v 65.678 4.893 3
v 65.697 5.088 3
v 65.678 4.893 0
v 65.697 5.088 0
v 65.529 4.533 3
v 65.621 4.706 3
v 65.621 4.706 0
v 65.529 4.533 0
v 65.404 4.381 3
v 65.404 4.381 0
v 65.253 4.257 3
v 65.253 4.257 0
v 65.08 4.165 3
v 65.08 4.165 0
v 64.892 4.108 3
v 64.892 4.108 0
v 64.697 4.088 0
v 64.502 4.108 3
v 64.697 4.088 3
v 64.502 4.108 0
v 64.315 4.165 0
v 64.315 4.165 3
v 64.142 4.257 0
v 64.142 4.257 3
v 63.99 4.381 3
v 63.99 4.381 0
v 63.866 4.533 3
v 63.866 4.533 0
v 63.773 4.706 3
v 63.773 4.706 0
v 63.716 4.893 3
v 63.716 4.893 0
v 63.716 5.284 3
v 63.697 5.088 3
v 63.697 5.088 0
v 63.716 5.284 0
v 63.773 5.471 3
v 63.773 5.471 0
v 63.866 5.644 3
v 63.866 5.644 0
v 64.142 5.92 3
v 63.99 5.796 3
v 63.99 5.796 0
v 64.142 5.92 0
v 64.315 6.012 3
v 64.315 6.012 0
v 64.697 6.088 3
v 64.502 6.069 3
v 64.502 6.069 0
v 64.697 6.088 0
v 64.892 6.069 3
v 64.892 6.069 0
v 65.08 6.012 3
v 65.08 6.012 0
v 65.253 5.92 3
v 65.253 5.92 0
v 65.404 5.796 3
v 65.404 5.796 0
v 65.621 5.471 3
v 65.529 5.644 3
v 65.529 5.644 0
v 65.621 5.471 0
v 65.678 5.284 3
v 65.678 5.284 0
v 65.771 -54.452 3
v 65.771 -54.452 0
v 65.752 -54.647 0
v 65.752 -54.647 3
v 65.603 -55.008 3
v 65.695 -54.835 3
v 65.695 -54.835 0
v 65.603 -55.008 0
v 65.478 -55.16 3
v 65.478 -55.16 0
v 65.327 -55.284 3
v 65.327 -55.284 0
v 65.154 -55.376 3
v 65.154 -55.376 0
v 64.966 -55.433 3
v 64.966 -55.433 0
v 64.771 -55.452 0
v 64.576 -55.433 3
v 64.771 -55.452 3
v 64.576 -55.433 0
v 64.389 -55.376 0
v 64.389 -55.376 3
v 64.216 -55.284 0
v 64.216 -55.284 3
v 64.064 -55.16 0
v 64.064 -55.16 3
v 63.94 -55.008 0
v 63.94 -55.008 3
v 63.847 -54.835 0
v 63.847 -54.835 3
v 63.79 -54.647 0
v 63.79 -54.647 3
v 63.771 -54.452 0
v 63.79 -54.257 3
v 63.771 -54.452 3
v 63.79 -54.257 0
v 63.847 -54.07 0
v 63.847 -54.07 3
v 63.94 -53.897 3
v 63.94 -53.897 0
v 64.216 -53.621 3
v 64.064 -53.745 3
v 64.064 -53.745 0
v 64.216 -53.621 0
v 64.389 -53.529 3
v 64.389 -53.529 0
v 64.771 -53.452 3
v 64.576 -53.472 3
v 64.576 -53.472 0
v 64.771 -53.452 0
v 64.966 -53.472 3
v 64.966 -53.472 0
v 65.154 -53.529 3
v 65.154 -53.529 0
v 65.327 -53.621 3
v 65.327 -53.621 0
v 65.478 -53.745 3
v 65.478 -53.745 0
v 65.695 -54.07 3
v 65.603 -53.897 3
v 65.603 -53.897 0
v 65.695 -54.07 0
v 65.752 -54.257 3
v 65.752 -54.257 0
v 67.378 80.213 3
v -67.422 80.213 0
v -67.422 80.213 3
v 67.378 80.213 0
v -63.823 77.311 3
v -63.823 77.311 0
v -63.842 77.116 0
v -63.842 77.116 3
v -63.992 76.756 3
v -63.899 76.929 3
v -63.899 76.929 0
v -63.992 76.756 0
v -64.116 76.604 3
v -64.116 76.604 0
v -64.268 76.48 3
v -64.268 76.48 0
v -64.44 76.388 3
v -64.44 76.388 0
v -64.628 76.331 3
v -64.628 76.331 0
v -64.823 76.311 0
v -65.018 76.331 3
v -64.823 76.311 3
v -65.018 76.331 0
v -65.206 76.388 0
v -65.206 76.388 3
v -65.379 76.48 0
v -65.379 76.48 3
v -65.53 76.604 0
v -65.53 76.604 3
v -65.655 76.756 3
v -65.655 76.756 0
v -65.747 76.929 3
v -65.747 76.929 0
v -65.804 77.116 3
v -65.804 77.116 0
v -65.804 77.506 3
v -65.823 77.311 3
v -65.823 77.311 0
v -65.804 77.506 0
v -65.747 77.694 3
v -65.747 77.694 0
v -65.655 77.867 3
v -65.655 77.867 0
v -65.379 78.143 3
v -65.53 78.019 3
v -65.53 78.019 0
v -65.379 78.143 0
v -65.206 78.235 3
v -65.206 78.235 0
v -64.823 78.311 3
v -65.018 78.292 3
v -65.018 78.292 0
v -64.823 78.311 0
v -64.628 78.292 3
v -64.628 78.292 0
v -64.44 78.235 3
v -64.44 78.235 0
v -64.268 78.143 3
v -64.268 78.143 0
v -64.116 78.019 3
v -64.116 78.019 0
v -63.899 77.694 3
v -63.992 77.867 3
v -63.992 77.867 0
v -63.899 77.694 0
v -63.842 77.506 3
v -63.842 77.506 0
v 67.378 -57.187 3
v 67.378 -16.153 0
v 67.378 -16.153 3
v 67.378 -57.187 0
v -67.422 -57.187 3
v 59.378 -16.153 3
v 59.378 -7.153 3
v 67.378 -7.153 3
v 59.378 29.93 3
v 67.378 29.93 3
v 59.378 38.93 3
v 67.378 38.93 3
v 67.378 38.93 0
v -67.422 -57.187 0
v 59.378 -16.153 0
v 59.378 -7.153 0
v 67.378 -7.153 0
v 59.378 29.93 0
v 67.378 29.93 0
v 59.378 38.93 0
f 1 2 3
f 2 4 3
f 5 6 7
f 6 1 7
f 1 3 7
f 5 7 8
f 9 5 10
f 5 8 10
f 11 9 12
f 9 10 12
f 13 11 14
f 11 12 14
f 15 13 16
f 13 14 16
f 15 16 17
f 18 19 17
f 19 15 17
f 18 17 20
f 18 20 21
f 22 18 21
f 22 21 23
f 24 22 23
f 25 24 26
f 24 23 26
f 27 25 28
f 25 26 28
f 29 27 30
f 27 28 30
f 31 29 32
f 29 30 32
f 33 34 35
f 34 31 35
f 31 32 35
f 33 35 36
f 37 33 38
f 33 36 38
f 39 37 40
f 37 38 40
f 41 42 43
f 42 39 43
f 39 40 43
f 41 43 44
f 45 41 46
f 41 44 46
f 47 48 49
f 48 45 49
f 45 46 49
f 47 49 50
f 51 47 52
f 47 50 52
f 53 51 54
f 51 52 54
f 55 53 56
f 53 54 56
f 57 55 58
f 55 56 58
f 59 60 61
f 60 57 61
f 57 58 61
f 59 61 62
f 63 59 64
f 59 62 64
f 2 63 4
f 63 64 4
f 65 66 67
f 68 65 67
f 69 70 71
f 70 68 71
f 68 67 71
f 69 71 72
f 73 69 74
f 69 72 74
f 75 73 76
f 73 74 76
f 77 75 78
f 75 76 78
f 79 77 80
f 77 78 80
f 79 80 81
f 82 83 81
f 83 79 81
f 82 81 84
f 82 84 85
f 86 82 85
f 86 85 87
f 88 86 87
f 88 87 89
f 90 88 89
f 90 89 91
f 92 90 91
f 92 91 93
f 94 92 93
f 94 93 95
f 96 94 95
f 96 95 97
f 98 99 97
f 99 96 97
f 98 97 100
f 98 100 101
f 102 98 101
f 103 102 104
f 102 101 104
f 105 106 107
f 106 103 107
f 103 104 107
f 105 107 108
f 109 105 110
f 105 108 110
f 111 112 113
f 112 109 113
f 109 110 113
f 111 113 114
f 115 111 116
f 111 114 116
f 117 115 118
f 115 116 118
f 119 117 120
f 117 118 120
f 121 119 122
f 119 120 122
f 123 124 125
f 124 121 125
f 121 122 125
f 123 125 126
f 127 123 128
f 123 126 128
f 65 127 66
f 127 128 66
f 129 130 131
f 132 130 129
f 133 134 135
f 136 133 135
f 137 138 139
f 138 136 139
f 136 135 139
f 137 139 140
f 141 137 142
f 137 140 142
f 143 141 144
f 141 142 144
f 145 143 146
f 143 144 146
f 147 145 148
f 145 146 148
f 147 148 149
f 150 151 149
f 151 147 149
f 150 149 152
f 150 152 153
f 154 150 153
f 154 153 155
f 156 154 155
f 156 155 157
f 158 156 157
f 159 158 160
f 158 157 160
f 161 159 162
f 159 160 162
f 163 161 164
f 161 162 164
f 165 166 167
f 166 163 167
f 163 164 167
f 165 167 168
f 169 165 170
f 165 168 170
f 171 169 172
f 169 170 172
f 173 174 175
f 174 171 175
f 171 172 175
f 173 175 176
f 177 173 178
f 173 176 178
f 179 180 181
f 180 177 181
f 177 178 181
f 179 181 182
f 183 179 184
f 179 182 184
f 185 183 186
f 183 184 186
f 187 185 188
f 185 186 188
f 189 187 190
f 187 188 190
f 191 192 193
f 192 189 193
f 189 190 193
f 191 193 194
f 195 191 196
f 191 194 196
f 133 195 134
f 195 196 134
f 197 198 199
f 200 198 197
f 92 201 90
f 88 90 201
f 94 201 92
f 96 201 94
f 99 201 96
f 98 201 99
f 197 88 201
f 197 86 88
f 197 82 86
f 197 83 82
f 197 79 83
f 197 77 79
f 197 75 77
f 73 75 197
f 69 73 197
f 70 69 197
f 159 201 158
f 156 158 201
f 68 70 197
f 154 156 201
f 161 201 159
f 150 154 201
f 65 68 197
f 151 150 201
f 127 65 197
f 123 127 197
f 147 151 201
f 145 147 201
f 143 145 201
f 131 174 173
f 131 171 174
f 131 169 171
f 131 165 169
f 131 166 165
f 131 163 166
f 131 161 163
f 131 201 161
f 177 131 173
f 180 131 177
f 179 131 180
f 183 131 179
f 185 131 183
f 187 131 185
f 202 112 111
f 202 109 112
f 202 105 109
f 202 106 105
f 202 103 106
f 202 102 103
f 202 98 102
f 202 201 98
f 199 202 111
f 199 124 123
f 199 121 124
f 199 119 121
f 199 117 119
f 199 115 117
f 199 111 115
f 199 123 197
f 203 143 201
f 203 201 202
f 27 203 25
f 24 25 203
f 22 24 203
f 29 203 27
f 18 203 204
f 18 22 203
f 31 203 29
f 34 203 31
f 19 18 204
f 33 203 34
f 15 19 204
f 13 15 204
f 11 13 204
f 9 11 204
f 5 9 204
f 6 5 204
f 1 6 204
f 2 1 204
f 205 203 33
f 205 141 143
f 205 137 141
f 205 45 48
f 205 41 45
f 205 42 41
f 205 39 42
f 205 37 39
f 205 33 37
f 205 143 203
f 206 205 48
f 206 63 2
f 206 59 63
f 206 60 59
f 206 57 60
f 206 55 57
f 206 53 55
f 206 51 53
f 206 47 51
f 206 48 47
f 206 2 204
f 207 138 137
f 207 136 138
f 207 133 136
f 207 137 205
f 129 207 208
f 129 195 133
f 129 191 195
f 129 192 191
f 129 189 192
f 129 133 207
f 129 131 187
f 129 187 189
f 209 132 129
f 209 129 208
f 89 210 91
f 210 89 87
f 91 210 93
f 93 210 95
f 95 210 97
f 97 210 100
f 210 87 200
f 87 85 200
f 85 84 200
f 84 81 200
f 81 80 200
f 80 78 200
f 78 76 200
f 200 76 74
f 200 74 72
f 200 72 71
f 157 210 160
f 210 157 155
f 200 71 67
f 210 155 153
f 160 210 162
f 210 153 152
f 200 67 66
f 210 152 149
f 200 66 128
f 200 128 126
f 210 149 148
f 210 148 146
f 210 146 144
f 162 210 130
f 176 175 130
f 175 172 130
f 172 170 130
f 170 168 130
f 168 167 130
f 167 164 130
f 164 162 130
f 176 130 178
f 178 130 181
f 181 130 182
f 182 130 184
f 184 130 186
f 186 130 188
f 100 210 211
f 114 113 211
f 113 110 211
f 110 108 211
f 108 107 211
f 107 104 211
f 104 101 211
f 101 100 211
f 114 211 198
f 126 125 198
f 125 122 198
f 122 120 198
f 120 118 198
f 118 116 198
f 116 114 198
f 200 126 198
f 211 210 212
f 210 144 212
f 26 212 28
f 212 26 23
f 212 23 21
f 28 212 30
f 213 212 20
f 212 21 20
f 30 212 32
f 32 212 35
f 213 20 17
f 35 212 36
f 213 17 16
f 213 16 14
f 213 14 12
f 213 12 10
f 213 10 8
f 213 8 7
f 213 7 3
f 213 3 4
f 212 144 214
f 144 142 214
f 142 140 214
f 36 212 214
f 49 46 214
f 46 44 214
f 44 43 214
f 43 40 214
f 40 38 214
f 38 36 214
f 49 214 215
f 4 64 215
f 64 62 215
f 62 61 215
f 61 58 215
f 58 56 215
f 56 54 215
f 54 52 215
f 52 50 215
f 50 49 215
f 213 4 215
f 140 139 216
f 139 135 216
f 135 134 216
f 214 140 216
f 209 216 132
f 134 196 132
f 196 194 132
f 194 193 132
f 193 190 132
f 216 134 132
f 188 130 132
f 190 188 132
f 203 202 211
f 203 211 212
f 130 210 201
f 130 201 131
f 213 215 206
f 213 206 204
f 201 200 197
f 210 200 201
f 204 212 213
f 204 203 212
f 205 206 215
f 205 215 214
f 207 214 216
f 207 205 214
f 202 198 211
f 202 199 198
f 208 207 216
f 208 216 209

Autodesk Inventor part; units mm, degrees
ref_plane "YZ Plane" through (0, 0, 0) normal (1, 0, 0) x (0, 1, 0)
ref_plane "XZ Plane" through (0, 0, 0) normal (0, 1, 0) x (-1, 0, 0)
ref_plane "XY Plane" through (0, 0, 0) normal (0, 0, 1) x (1, 0, 0)
ref_plane "Work Plane1" through (0, 0, 0) normal (0, 0, 1) x (1, 0, 0)
sketch "Sketch1" plane through (0, 0, 0) normal (0, 0, 1) x (1, 0, 0)
  line L0 (67.3785, -57.1866) -> (-67.4215, -57.1866)
  line L1 (-67.4215, -57.1866) -> (-67.4215, 80.2134)
  line L2 (-67.4215, 80.2134) -> (67.3785, 80.2134)
  line L3 (67.3785, 80.2134) -> (67.3785, -57.1866)
  circle A0 centre (64.6972, 5.0885) radius 1
  circle A1 centre (-64.8231, 77.3114) radius 1
  circle A2 centre (64.7712, -54.4524) radius 1
  point P0 (0, 0)
  dimension "d0" = 2
  dimension "d1" = 2
  dimension "d4" = 2
  dimension "d11" = 137.4
  dimension "d12" = 134.8
extrude "Extrusion1" add sketch "Sketch1" along normal blind 3
sketch "Sketch2" plane through (0, 0, 3) normal (0, 0, 1) x (1, 0, 0)
  line L0 (67.3785, -57.1866) -> (67.3785, 80.2134) projected
  line L1 (67.3785, -16.1531) -> (59.3785, -16.1531)
  line L2 (59.3785, -16.1531) -> (59.3785, -7.1531)
  line L3 (59.3785, -7.1531) -> (67.3785, -7.1531)
  line L4 (67.3785, -7.1531) -> (67.3785, -16.1531)
  line L5 (67.3785, 29.9305) -> (59.3785, 29.9305)
  line L6 (59.3785, 29.9305) -> (59.3785, 38.9305)
  line L7 (59.3785, 38.9305) -> (67.3785, 38.9305)
  line L8 (67.3785, 38.9305) -> (67.3785, 29.9305)
  point P0 (0, 0)
  dimension "d5" = 8
  dimension "d6" = 9
  dimension "d7" = 8
  dimension "d8" = 9
extrude "Extrusion2" cut sketch "Sketch2" against normal through all
properties part number "CoverPSU"
